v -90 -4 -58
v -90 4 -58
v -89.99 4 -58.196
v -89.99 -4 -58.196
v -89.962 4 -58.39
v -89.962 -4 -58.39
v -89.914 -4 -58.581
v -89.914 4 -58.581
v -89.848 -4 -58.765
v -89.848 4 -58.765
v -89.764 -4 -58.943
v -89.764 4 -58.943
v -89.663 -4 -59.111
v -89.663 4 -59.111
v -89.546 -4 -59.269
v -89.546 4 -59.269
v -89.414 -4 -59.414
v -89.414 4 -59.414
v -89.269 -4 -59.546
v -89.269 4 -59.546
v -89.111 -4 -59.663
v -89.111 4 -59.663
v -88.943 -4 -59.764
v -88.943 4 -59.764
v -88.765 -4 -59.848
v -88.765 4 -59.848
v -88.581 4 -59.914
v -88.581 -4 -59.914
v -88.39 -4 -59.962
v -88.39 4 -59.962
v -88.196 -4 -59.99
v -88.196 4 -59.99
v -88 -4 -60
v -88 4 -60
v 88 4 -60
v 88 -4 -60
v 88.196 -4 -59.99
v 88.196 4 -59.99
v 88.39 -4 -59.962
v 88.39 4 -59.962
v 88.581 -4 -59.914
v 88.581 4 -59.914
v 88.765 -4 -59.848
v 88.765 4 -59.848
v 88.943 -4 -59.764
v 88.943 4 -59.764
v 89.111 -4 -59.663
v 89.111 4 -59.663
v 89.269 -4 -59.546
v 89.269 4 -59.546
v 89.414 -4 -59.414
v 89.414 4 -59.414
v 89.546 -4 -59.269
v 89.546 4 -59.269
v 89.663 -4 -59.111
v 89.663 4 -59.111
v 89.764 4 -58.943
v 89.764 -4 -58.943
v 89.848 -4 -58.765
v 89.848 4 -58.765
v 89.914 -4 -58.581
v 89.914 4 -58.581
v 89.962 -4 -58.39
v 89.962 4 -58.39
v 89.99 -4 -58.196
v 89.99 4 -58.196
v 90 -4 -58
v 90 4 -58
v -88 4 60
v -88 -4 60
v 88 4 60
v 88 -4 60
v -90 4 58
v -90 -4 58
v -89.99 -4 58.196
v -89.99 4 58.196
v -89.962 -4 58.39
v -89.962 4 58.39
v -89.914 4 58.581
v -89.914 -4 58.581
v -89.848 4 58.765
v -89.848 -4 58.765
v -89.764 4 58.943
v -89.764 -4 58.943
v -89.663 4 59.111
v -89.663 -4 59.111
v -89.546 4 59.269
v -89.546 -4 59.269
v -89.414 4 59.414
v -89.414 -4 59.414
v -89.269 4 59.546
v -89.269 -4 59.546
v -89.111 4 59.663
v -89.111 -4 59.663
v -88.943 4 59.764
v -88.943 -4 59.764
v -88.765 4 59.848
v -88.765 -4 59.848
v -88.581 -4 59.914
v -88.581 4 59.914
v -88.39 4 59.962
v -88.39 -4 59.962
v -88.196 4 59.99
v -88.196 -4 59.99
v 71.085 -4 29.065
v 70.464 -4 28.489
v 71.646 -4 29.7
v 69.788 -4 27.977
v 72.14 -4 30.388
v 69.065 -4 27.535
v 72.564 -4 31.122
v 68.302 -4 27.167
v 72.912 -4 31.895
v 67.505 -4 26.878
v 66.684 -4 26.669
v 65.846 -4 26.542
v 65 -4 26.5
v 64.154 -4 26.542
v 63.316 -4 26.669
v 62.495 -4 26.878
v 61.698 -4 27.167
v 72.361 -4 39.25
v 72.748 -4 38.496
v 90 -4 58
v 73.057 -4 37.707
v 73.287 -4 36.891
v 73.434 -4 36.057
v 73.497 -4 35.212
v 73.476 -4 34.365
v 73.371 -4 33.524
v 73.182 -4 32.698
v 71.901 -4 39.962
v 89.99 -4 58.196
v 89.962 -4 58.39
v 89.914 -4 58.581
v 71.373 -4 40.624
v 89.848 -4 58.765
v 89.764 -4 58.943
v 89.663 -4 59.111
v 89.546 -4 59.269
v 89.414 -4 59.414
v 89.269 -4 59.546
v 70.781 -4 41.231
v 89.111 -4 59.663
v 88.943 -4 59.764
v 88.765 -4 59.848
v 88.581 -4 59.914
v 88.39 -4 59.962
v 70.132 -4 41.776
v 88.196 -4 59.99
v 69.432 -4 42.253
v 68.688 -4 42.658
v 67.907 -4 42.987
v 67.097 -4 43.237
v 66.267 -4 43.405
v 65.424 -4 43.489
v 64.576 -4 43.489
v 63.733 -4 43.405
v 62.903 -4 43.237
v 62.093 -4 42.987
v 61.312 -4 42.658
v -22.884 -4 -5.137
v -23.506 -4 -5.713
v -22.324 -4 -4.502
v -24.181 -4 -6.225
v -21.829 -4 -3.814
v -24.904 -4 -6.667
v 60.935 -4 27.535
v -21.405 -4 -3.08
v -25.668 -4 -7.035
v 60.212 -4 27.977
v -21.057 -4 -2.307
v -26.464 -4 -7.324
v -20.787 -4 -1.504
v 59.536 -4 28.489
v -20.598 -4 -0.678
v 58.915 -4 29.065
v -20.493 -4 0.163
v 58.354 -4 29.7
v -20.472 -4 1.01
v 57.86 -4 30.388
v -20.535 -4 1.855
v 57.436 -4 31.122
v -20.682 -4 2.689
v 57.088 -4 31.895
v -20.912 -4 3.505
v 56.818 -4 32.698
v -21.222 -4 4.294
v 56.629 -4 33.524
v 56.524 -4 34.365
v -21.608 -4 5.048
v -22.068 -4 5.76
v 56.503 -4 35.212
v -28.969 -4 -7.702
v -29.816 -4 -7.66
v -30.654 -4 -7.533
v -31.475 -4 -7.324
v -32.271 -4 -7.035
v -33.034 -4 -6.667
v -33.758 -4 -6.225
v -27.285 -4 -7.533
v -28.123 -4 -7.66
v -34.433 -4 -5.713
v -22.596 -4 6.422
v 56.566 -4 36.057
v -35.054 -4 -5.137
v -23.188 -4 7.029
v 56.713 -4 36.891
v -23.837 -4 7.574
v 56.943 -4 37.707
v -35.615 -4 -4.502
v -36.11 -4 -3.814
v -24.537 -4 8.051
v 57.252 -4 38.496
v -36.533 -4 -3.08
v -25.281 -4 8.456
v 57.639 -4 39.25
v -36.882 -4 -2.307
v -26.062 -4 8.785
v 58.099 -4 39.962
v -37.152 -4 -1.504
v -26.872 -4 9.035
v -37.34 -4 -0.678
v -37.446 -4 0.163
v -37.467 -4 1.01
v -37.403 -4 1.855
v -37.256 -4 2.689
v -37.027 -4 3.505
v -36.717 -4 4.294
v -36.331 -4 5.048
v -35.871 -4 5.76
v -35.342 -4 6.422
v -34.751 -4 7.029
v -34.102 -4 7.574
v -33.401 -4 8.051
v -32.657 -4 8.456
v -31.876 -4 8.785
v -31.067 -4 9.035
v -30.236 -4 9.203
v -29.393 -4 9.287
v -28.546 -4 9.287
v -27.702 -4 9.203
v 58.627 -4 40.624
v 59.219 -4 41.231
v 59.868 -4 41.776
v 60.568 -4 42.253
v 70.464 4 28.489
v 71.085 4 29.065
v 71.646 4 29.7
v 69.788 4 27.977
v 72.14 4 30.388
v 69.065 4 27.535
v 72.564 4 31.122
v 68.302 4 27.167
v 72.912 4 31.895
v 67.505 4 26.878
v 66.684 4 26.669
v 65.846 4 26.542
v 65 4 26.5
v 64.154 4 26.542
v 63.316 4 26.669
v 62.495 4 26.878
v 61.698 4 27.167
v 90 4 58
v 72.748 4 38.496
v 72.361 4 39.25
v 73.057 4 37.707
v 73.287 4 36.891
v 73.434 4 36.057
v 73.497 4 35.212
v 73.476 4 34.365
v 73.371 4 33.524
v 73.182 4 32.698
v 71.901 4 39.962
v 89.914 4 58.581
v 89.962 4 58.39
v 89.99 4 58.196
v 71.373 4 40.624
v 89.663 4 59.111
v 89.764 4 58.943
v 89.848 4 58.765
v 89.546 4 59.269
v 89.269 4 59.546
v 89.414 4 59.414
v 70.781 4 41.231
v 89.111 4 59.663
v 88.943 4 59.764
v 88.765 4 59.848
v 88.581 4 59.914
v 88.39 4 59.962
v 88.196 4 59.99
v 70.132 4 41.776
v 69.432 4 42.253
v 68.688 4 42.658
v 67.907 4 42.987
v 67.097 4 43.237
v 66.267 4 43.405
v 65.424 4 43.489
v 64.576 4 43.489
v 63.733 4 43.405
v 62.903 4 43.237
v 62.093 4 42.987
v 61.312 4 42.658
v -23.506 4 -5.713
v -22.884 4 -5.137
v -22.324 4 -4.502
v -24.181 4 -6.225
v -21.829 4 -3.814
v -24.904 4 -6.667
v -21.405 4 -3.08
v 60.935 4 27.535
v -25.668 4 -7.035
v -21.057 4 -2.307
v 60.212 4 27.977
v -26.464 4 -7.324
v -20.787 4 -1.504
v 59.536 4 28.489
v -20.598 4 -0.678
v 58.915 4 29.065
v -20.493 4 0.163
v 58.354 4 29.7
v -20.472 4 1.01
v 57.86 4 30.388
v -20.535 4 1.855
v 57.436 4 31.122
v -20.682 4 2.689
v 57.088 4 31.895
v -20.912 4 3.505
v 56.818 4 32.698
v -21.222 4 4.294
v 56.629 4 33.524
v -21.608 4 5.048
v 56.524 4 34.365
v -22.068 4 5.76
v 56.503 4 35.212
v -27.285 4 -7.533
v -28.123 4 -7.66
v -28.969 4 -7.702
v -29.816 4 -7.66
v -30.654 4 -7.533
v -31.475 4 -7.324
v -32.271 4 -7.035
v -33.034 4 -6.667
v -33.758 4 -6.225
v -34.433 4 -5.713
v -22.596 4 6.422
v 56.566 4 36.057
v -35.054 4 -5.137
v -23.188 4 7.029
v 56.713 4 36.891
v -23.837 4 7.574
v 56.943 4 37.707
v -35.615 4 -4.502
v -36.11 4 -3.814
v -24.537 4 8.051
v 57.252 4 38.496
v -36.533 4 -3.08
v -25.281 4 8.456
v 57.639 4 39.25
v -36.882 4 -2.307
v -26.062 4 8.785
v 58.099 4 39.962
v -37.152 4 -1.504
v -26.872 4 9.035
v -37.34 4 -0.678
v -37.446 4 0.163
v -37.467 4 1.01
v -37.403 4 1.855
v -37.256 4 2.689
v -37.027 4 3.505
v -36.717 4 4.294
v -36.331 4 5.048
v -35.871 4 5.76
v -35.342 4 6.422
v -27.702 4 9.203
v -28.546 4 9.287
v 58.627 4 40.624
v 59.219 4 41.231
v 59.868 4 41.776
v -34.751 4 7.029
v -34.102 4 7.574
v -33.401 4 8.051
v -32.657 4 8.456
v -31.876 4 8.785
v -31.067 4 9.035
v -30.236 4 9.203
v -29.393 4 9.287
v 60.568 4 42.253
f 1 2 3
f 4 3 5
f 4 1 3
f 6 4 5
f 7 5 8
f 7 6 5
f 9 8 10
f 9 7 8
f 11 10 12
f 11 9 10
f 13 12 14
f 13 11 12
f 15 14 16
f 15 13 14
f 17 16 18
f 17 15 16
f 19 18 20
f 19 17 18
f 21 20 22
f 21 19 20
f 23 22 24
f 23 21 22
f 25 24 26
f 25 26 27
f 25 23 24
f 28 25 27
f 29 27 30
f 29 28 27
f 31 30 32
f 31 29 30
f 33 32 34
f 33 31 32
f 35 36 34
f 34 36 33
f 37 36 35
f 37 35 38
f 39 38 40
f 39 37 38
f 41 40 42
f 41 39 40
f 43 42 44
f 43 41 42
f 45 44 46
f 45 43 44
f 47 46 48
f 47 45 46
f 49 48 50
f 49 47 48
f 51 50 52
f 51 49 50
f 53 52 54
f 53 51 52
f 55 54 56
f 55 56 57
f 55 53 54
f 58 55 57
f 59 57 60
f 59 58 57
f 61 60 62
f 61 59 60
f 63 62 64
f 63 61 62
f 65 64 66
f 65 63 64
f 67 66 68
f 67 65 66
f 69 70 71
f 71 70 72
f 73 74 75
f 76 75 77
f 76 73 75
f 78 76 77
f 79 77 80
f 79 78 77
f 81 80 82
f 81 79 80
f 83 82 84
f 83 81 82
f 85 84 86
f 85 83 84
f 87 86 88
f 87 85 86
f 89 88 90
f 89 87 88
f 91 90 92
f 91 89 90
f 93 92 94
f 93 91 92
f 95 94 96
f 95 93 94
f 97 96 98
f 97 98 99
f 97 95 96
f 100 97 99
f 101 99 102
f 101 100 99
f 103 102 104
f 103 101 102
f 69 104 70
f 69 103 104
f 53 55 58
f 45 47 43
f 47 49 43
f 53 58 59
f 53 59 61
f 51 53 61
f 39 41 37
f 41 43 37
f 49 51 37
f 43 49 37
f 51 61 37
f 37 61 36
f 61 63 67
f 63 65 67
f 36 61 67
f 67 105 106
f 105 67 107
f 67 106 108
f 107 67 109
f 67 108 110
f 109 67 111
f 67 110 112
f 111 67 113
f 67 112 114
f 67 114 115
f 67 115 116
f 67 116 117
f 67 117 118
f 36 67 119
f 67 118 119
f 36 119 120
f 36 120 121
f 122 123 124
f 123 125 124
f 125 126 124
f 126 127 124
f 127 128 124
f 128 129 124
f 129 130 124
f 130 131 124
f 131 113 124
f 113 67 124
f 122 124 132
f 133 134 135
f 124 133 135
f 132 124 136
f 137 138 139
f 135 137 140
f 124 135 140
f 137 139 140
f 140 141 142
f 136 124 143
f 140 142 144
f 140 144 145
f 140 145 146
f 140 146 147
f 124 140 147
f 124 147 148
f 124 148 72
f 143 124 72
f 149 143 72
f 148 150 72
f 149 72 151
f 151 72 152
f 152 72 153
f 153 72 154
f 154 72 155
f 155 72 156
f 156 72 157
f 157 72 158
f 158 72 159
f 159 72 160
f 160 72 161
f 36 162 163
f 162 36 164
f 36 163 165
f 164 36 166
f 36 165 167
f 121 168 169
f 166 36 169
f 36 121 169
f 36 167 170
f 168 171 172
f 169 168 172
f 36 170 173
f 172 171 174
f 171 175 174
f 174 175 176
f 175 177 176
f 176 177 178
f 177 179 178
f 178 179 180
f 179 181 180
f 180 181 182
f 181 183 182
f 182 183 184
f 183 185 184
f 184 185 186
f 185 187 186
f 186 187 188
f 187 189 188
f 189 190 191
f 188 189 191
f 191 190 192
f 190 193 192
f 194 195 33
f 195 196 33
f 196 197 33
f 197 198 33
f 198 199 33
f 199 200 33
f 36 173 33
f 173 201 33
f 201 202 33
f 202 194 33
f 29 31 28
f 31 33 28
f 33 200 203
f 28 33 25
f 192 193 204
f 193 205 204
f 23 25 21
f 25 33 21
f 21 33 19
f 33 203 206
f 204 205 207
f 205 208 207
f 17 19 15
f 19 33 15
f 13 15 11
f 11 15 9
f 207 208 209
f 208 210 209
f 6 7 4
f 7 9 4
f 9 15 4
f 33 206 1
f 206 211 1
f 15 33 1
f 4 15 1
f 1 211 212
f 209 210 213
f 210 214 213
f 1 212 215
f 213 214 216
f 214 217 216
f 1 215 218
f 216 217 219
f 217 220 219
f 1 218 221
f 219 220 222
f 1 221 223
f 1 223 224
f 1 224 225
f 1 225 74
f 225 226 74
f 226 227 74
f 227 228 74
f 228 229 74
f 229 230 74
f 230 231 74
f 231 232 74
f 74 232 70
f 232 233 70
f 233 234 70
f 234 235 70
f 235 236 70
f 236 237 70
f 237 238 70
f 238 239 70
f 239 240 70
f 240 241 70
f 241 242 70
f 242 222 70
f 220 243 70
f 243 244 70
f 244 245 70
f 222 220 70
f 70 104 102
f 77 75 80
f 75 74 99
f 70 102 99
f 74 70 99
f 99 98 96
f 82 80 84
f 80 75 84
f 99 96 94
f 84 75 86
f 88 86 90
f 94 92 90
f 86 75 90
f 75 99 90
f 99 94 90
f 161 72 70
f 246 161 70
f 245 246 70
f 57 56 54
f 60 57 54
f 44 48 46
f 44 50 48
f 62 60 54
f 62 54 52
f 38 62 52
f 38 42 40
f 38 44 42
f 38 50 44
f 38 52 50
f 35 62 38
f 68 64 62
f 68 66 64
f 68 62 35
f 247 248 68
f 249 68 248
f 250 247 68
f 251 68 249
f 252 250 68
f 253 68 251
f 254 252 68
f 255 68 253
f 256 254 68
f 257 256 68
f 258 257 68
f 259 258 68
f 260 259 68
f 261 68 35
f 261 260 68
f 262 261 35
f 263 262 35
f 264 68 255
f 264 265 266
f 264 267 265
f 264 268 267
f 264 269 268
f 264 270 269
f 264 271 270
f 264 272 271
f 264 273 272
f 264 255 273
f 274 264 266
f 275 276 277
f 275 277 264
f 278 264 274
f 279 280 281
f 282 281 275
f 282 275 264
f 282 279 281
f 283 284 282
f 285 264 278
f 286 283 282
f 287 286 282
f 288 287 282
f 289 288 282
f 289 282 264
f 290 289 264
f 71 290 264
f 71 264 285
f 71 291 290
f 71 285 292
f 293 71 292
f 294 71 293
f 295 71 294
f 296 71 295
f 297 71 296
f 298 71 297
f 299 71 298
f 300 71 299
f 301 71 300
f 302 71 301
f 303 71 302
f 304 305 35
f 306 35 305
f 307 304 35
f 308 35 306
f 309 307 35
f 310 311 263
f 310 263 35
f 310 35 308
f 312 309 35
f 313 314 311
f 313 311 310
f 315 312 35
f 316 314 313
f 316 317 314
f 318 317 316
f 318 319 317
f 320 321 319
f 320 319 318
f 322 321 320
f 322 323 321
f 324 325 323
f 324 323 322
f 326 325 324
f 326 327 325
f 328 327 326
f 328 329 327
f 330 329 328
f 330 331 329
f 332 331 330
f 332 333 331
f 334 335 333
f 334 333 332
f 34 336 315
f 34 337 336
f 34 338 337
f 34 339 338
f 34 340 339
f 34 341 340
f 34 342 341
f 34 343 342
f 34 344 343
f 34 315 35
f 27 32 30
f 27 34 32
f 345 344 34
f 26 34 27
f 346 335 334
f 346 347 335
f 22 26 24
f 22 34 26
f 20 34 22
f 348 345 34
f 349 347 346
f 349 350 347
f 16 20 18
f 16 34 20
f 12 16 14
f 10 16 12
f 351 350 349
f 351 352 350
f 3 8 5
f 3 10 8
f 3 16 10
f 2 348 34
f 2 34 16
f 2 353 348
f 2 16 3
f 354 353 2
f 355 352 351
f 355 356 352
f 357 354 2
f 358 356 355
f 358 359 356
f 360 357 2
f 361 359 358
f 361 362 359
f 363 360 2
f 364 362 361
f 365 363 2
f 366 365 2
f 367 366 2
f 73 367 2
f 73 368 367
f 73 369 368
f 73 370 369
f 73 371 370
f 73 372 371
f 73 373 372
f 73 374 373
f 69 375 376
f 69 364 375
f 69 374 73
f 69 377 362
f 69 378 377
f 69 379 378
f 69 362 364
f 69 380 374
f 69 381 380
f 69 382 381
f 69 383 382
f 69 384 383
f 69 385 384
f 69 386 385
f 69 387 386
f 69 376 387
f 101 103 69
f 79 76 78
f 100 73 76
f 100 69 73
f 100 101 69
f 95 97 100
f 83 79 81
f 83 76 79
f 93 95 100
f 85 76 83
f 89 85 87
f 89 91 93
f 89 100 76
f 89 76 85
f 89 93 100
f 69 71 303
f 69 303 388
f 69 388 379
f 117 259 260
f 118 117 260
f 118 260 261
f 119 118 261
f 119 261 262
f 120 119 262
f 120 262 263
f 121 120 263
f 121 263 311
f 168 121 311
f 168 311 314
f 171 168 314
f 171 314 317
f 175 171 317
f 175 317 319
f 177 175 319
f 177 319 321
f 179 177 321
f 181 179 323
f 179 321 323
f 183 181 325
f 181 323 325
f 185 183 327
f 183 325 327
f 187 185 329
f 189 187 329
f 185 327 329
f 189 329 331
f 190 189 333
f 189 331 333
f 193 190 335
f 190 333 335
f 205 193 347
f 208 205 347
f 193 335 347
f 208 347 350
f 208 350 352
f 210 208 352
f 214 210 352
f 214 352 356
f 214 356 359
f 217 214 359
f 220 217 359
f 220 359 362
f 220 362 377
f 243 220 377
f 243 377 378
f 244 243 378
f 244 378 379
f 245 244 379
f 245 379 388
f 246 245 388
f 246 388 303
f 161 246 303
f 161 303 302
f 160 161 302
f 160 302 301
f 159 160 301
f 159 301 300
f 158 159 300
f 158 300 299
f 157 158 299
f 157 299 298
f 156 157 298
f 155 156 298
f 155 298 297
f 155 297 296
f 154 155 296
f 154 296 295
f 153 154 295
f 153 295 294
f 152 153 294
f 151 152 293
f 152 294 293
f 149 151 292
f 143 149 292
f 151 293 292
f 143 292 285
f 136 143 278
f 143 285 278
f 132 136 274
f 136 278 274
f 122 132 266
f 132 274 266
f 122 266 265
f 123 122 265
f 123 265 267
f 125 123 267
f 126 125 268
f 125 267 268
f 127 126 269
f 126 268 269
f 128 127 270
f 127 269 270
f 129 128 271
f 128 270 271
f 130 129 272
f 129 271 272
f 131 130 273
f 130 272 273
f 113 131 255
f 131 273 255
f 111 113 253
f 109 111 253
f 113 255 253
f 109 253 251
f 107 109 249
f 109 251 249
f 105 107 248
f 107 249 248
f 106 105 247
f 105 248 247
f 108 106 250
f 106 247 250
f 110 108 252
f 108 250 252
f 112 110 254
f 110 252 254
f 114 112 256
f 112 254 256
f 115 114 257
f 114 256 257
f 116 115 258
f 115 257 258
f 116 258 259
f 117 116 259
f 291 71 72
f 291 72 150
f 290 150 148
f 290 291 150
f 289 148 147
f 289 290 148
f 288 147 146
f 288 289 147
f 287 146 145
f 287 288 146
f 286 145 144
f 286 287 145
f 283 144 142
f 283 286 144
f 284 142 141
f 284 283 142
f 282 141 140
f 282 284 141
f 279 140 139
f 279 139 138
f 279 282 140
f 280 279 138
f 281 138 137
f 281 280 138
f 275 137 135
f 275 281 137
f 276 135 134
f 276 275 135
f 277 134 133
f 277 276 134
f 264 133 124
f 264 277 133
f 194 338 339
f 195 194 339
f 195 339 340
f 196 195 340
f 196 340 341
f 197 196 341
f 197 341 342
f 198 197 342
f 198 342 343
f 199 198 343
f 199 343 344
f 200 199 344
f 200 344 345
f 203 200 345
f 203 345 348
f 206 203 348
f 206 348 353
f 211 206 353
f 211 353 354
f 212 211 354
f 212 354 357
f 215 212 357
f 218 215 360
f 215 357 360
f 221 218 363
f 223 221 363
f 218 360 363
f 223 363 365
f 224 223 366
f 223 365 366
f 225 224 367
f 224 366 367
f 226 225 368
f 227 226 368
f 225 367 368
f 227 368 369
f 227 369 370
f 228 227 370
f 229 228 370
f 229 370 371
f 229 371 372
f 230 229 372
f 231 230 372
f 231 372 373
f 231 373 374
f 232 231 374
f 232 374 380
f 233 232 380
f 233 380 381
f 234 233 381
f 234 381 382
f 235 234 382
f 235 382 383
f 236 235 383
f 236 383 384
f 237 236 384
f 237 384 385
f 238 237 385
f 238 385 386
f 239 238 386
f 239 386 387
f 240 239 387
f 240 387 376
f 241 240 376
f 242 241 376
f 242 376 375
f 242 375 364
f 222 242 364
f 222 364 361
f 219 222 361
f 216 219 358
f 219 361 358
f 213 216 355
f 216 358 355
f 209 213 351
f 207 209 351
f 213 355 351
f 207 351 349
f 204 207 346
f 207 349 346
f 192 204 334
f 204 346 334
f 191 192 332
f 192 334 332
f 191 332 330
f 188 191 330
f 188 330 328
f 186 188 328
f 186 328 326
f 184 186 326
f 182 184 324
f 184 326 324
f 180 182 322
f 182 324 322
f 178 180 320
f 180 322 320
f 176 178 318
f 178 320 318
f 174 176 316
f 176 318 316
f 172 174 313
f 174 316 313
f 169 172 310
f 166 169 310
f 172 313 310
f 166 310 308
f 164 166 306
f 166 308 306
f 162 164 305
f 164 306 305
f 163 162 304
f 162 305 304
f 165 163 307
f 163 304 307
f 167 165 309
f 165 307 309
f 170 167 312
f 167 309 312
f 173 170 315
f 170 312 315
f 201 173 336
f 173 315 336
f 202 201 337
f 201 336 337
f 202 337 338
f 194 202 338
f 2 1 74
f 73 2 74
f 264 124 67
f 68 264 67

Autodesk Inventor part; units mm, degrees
ref_plane "YZ Plane" through (0, 0, 0) normal (1, 0, 0) x (0, 1, 0)
ref_plane "XZ Plane" through (0, 0, 0) normal (0, 1, 0) x (-1, 0, 0)
ref_plane "XY Plane" through (0, 0, 0) normal (0, 0, 1) x (1, 0, 0)
sketch "Sketch1" plane through (0, 0, 0) normal (0, 1, 0) x (-1, 0, 0)
  line L0 (90, 60) -> (-90, 60)
  line L1 (-90, 60) -> (-90, -60)
  line L2 (-90, -60) -> (90, -60)
  line L3 (90, -60) -> (90, 60)
  point P0 (0, 0)
  point P1 (0, 60)
  point P2 (90, 0)
  dimension "d0" = 180
  dimension "d1" = 120
extrude "Plate1" add sketch "Sketch1" along normal mid plane 8
sketch "Sketch2" plane through (0, -4, 0) normal (0, -1, 0) x (1, 0, 0)
  line L0 (65, 35) -> (-28.9693, 0.798) construction
  line L1 (-90, -60) -> (-90, 60) projected
  line L2 (90, 60) -> (90, -60) projected
  point P0 (0, 0)
  point P1 (-90, 0)
  dimension "d17" = 100
  dimension "d18" = 25
  dimension "d19" = 25
  dimension "d20" = 70
hole "Hole1" at (65, -4, 35) at (-28.9693, -4, 0.798) direction (0, 1, 0) diameter 17 end through all
fillet "Fillet1" radius 2 4 edges at (90, 0, 60) (-90, 0, 60) (90, 0, -60) (-90, 0, -60)
equation "\"d19\" = d18"
equation "\"d8\" = Thickness"
equation "\"d2\" = Thickness"
equation "\"BendRadius\" = Thickness"
equation "\"BendReliefWidth\" = Thickness"
equation "\"BendReliefDepth\" = 0.5 * Thickness"
equation "\"CornerReliefSize\" = 4 * Thickness"
equation "\"MinimumRemnant\" = 2 * Thickness"
equation "\"TransitionRadius\" = BendRadius"
equation "\"JacobiRadiusSize\" = BendRadius"
equation "\"GapSize\" = Thickness"
equation "\"Thickness\" = 8"
properties part number "Ухо на стойку_CPY"
